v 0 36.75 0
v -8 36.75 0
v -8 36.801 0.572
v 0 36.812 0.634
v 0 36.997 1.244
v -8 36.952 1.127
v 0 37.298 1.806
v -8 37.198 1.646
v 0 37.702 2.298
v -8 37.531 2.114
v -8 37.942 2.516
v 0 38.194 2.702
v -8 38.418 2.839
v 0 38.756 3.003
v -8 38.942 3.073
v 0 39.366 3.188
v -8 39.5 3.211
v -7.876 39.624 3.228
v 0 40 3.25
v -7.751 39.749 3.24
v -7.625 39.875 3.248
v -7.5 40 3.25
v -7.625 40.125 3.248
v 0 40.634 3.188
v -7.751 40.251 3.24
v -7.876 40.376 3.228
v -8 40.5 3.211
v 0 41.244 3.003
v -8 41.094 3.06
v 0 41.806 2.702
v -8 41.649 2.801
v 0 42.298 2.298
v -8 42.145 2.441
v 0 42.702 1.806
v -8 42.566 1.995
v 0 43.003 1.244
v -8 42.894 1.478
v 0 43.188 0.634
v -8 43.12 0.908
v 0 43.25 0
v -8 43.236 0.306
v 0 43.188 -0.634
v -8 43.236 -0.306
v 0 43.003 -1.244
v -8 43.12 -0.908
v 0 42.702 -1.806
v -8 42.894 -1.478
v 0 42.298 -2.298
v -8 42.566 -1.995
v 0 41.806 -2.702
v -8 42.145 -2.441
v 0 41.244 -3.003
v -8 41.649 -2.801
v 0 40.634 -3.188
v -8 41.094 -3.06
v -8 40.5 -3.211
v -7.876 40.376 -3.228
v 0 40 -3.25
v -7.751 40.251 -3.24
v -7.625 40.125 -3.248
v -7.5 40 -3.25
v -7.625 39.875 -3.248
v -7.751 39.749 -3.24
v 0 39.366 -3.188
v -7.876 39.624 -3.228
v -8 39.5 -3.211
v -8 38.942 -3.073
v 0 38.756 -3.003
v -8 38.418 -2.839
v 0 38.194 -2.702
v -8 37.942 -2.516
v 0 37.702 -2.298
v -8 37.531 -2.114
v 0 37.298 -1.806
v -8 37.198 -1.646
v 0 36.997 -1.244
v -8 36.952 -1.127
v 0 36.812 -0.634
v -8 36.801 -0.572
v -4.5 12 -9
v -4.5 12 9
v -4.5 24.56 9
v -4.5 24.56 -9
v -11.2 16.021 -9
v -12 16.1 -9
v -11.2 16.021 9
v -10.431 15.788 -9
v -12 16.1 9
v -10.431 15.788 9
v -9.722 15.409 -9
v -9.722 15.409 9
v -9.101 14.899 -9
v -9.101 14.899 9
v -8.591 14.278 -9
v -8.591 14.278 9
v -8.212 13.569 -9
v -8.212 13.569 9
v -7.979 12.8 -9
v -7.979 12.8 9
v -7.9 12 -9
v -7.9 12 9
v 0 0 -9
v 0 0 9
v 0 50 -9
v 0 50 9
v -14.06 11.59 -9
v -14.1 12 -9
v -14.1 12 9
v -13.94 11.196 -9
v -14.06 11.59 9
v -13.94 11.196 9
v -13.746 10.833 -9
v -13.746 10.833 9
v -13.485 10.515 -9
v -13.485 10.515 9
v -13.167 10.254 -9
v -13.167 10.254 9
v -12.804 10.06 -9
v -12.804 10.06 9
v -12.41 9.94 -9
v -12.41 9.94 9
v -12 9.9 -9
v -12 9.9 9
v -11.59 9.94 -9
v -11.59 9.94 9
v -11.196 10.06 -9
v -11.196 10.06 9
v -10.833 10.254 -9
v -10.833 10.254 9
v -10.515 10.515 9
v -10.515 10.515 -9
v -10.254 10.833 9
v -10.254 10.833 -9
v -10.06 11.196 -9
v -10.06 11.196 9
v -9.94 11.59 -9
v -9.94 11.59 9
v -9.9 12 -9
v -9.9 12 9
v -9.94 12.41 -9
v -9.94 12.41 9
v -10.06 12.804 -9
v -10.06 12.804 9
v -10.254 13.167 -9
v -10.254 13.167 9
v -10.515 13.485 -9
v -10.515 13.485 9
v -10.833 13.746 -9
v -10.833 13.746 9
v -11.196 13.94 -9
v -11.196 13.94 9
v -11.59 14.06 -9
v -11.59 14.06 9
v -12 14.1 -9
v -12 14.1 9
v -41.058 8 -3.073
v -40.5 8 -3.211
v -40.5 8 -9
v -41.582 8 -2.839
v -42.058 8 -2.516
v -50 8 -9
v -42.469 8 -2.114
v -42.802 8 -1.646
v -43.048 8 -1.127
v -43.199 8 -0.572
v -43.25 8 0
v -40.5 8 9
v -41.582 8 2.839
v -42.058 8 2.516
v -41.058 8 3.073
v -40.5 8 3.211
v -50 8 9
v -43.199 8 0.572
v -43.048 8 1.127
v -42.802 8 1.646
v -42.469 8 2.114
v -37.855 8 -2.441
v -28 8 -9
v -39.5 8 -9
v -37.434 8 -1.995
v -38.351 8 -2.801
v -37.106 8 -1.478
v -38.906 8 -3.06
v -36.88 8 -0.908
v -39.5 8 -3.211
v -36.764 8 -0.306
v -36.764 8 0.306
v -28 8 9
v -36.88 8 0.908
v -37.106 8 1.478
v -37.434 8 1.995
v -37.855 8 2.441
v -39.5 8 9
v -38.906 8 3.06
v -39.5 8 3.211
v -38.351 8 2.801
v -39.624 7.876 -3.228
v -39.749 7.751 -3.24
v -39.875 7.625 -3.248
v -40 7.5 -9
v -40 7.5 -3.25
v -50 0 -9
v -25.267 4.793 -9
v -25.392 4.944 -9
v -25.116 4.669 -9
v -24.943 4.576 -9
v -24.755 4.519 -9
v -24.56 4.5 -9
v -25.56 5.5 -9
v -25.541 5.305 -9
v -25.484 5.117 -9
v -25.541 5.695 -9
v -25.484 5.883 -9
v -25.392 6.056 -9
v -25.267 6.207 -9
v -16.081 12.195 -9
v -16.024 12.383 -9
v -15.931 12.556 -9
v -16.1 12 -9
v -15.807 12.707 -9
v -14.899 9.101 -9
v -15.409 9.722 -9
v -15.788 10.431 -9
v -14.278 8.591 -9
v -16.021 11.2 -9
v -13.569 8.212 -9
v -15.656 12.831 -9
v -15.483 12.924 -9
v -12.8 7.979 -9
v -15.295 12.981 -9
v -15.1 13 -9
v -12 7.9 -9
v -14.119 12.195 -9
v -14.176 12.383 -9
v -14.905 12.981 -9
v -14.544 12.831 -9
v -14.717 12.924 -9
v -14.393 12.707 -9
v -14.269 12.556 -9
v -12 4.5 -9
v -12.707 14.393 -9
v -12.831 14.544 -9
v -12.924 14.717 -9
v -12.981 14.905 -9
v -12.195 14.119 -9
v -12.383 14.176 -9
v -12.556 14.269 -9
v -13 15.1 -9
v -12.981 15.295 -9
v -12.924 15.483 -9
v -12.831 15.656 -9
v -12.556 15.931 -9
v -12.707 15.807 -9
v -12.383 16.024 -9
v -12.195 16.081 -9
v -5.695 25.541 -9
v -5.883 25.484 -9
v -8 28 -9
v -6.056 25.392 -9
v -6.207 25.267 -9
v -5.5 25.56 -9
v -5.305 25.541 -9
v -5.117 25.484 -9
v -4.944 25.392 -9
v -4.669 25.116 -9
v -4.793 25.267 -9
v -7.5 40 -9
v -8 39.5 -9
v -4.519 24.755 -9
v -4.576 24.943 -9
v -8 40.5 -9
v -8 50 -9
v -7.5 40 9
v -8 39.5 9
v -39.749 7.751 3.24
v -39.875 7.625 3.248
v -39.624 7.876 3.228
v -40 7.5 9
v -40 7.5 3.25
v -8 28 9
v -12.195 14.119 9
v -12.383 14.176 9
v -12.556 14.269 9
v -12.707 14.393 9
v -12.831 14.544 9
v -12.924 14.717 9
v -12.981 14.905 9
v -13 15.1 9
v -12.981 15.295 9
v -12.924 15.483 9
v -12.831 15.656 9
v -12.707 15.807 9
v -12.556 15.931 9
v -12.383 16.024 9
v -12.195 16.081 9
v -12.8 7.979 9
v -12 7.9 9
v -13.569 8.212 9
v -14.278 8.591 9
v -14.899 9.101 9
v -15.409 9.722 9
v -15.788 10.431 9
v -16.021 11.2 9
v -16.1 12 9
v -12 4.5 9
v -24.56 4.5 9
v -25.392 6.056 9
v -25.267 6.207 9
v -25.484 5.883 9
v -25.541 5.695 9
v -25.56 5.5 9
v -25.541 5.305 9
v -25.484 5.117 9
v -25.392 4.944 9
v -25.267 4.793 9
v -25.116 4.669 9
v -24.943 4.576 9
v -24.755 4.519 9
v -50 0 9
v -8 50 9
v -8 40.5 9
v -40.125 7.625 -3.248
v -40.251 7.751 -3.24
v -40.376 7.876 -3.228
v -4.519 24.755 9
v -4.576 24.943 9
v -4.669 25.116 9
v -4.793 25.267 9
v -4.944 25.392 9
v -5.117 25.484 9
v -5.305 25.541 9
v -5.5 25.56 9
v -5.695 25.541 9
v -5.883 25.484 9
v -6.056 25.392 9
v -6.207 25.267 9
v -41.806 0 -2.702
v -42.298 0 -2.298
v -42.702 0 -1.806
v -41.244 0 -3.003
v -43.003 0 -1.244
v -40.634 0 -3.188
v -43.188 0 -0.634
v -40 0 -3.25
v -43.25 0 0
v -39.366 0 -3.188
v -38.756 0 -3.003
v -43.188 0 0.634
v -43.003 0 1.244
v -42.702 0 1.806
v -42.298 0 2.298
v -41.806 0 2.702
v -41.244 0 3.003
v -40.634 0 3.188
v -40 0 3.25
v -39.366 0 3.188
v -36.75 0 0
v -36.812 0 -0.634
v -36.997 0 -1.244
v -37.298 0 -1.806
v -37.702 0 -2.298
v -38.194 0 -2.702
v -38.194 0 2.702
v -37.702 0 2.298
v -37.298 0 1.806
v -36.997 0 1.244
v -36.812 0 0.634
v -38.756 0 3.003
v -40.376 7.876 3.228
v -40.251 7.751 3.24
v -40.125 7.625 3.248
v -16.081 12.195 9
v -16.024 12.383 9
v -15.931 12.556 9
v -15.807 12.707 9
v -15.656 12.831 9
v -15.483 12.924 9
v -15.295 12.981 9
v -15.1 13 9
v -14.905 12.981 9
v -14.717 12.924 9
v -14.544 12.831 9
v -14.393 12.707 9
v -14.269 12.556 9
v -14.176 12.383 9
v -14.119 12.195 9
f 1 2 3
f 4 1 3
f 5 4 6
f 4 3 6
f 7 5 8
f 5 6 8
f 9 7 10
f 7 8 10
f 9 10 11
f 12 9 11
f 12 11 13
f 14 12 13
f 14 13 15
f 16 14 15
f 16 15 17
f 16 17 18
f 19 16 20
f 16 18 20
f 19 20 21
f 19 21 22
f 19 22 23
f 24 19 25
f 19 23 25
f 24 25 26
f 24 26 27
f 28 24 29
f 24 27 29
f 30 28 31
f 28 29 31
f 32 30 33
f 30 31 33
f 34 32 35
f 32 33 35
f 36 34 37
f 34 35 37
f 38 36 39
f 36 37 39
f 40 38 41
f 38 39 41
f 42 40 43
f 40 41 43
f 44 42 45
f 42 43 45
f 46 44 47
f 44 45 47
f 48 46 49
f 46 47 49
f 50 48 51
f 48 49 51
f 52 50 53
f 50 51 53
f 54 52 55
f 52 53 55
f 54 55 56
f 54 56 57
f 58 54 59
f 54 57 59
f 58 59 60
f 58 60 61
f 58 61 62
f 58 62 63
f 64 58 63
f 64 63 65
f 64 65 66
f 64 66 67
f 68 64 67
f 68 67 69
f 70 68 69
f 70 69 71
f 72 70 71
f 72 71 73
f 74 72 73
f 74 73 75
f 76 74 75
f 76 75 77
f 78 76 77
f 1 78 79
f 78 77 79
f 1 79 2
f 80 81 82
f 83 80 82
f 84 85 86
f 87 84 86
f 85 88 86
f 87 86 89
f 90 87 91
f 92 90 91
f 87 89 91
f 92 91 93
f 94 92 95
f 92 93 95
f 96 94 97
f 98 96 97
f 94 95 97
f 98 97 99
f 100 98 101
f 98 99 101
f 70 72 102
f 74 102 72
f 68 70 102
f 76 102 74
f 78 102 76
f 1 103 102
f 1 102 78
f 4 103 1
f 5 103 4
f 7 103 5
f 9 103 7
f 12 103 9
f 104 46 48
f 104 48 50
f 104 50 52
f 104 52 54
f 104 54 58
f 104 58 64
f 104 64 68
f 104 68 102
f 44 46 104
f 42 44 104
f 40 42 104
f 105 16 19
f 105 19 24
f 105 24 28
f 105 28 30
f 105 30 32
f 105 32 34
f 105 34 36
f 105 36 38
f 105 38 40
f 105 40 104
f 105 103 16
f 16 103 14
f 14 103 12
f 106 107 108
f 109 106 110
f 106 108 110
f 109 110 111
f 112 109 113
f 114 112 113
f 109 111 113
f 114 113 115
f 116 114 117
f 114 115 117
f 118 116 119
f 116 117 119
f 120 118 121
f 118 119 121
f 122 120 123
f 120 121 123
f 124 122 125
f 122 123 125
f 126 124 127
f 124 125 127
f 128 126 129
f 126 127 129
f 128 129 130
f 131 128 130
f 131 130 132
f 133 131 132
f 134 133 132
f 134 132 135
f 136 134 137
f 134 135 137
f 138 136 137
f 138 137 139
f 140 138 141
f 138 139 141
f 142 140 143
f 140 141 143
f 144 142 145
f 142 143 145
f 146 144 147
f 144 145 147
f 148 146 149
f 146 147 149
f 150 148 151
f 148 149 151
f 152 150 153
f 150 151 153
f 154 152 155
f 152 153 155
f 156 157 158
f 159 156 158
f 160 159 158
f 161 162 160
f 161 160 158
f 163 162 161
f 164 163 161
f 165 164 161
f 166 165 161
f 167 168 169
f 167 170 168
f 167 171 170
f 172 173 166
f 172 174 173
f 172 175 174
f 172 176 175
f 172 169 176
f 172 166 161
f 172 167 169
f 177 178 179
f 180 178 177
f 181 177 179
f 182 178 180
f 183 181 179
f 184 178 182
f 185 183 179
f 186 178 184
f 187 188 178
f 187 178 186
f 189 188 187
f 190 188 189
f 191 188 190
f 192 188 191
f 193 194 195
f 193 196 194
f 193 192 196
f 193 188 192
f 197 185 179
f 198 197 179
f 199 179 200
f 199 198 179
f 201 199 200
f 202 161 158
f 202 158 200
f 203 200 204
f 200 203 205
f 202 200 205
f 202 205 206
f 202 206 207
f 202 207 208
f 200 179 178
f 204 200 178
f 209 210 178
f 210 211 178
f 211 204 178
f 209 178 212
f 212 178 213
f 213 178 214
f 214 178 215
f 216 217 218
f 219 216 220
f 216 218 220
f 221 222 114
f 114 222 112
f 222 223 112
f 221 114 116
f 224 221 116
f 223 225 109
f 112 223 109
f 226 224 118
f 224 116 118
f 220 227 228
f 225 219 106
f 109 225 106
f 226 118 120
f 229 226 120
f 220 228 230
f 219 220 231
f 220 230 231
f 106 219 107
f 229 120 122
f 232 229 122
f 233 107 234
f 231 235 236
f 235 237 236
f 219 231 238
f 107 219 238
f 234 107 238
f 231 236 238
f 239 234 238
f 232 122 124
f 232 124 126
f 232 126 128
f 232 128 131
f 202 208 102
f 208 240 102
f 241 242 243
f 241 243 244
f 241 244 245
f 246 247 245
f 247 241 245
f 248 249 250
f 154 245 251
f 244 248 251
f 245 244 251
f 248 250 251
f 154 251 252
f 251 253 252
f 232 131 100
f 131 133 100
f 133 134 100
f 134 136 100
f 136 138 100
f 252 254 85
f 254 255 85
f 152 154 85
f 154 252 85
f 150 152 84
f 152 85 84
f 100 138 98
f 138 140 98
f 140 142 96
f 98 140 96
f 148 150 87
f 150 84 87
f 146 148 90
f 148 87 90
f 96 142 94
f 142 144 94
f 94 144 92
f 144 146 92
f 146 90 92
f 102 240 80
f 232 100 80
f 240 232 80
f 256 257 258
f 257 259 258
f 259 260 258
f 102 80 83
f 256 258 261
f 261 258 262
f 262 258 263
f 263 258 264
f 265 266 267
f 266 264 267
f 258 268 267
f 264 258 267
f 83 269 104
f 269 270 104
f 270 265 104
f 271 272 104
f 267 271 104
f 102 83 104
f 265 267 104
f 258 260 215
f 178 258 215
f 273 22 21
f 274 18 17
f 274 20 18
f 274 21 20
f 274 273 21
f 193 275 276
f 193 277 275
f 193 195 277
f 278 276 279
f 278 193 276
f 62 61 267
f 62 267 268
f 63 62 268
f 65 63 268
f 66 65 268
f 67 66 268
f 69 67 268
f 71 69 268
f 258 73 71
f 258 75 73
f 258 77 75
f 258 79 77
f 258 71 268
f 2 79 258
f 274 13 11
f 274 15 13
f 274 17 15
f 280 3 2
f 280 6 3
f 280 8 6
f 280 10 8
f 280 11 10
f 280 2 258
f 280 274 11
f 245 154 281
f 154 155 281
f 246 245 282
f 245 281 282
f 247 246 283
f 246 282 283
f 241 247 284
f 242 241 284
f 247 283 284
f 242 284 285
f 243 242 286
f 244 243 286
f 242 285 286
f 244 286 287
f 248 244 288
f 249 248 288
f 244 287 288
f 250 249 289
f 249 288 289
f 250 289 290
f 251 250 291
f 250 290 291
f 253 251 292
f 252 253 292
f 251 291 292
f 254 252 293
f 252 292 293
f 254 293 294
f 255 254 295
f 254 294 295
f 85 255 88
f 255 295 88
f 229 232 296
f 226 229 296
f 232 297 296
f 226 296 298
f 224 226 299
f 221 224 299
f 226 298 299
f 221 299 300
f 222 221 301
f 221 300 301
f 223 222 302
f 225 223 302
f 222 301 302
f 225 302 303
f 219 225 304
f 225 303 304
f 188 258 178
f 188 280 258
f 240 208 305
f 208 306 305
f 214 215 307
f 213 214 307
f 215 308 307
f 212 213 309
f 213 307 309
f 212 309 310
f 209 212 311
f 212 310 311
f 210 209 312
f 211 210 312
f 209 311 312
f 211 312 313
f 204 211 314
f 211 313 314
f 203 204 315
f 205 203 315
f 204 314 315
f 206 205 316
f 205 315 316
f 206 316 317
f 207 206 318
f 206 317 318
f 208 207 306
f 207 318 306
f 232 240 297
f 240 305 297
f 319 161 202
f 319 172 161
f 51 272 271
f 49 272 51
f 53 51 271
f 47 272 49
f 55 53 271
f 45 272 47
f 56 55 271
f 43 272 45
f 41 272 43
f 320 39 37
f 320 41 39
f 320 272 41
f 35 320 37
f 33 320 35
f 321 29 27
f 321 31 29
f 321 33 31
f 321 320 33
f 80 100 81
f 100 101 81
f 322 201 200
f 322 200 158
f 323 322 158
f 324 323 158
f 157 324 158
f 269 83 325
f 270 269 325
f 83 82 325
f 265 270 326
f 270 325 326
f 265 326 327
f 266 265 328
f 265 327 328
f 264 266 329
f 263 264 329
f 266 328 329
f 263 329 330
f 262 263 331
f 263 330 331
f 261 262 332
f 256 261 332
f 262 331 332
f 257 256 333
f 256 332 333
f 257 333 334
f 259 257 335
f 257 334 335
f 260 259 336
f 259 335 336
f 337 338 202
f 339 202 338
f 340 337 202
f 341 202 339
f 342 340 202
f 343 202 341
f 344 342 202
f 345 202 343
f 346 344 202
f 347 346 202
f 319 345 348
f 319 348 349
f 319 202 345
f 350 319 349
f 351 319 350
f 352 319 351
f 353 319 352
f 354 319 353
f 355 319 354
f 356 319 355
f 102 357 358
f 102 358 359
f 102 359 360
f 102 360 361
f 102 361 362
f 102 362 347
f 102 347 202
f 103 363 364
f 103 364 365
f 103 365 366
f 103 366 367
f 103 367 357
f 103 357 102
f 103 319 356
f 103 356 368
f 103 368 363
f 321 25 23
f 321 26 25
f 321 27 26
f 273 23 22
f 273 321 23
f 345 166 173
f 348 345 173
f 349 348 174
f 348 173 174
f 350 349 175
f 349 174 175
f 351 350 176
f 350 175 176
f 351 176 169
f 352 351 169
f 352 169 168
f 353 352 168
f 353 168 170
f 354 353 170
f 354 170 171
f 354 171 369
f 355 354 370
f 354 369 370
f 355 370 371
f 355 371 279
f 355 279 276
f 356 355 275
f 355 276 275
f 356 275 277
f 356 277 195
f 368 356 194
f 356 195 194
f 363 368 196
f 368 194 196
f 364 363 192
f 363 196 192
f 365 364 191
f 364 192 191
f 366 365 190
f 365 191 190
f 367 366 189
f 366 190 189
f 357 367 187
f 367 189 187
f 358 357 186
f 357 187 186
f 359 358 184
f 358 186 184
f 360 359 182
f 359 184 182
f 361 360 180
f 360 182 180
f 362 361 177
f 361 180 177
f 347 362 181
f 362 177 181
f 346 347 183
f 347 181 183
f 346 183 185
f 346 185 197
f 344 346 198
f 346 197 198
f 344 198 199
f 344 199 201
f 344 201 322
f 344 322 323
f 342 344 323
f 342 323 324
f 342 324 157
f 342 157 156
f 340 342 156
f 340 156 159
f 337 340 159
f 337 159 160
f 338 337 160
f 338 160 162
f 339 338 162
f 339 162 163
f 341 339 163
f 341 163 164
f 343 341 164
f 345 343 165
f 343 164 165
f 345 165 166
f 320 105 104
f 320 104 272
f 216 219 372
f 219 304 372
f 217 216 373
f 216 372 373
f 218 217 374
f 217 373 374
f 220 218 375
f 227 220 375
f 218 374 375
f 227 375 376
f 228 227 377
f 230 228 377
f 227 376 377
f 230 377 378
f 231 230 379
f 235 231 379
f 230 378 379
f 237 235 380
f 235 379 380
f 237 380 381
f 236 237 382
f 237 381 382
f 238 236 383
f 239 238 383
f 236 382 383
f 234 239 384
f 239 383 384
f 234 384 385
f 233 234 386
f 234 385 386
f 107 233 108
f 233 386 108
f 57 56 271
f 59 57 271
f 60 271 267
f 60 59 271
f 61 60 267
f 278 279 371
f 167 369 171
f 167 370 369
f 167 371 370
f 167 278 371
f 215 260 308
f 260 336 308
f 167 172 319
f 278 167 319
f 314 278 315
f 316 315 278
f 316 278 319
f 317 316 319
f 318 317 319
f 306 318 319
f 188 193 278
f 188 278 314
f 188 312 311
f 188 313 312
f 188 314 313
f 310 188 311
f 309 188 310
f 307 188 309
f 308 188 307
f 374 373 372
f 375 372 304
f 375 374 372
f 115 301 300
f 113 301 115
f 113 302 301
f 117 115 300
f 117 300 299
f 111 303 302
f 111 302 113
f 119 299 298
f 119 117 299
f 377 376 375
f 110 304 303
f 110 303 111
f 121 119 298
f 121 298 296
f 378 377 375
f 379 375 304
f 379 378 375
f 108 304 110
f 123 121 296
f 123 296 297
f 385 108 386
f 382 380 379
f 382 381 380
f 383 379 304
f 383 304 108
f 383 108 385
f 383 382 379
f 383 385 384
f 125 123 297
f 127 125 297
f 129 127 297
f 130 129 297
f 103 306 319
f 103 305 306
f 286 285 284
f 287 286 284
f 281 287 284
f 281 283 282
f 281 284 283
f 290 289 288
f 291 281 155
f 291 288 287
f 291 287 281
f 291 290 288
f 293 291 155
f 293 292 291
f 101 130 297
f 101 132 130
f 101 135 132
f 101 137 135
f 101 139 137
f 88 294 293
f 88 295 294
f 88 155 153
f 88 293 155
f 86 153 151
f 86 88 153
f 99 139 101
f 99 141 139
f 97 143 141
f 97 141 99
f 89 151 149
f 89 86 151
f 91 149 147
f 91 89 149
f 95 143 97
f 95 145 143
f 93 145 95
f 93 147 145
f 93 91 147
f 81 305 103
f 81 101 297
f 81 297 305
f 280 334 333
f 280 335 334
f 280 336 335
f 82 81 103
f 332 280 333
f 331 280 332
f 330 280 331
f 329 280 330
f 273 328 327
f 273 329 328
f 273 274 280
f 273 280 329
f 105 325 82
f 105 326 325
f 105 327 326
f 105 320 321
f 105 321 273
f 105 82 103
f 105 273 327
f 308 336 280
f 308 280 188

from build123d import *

# Parameters (mm, degrees)
EXTRUDE_1_DEPTH     = 9
SKETCH_2_R          = 3.25
CUT_EXTRUDE_1_DEPTH = 9
SKETCH_3_R          = 3.25
CUT_EXTRUDE_2_DEPTH = 9


with BuildPart() as part:
    # Эскиз1 → Бобышка-Вытянуть1 (new body, symmetric)
    with BuildSketch(Plane.XY):
        Polygon((-50, 0), (0, 0), (0, 50), (-8, 50), (-8, 40.5), (-7.5, 40), (-8, 39.5), (-8, 28), (-28, 8), (-39.5, 8), (-40, 7.5), (-40.5, 8), (-50, 8), align=None)
        with BuildLine():
            Line((-4.5, 12), (-4.5, 24.560303038))
            ThreePointArc((-4.5, 24.560303038), (-5.117316568, 25.484182571), (-6.207106781, 25.267409819))
            Line((-6.207106781, 25.267409819), (-25.267409819, 6.207106781))
            ThreePointArc((-25.267409819, 6.207106781), (-25.484182571, 5.117316568), (-24.560303038, 4.5))
            Line((-24.560303038, 4.5), (-12, 4.5))
            Line((-12, 4.5), (-12, 7.9))
            ThreePointArc((-12, 7.9), (-14.899137803, 9.100862197), (-16.1, 12))
            ThreePointArc((-16.1, 12), (-15.1, 13), (-14.1, 12))
            ThreePointArc((-14.1, 12), (-10.51507576, 10.51507576), (-12, 14.1))
            ThreePointArc((-12, 14.1), (-13, 15.1), (-12, 16.1))
            ThreePointArc((-12, 16.1), (-9.100862197, 14.899137803), (-7.9, 12))
            Line((-7.9, 12), (-4.5, 12))
        make_face(mode=Mode.SUBTRACT)
    extrude(amount=EXTRUDE_1_DEPTH, both=True)

    # Эскиз2 → Вырез-Вытянуть1 (cut, through all)
    with BuildSketch(Plane.ZY.offset(8)):
        with Locations(Location((0, 40, 0), (0, 0, 270))):  # turned: the seam where the file's is
            Circle(SKETCH_2_R)
    extrude(amount=-CUT_EXTRUDE_1_DEPTH, mode=Mode.SUBTRACT)

    # Эскиз3 → Вырез-Вытянуть2 (cut, through all)
    with BuildSketch(Plane(origin=(0, 8, 0), x_dir=(1, 0, 0), z_dir=(0, 1, 0))):
        with Locations(Location((-40, 0, 0), (0, 0, 180))):  # turned: the seam where the file's is
            Circle(SKETCH_3_R)
    extrude(amount=-CUT_EXTRUDE_2_DEPTH, mode=Mode.SUBTRACT)


solid = part.part
